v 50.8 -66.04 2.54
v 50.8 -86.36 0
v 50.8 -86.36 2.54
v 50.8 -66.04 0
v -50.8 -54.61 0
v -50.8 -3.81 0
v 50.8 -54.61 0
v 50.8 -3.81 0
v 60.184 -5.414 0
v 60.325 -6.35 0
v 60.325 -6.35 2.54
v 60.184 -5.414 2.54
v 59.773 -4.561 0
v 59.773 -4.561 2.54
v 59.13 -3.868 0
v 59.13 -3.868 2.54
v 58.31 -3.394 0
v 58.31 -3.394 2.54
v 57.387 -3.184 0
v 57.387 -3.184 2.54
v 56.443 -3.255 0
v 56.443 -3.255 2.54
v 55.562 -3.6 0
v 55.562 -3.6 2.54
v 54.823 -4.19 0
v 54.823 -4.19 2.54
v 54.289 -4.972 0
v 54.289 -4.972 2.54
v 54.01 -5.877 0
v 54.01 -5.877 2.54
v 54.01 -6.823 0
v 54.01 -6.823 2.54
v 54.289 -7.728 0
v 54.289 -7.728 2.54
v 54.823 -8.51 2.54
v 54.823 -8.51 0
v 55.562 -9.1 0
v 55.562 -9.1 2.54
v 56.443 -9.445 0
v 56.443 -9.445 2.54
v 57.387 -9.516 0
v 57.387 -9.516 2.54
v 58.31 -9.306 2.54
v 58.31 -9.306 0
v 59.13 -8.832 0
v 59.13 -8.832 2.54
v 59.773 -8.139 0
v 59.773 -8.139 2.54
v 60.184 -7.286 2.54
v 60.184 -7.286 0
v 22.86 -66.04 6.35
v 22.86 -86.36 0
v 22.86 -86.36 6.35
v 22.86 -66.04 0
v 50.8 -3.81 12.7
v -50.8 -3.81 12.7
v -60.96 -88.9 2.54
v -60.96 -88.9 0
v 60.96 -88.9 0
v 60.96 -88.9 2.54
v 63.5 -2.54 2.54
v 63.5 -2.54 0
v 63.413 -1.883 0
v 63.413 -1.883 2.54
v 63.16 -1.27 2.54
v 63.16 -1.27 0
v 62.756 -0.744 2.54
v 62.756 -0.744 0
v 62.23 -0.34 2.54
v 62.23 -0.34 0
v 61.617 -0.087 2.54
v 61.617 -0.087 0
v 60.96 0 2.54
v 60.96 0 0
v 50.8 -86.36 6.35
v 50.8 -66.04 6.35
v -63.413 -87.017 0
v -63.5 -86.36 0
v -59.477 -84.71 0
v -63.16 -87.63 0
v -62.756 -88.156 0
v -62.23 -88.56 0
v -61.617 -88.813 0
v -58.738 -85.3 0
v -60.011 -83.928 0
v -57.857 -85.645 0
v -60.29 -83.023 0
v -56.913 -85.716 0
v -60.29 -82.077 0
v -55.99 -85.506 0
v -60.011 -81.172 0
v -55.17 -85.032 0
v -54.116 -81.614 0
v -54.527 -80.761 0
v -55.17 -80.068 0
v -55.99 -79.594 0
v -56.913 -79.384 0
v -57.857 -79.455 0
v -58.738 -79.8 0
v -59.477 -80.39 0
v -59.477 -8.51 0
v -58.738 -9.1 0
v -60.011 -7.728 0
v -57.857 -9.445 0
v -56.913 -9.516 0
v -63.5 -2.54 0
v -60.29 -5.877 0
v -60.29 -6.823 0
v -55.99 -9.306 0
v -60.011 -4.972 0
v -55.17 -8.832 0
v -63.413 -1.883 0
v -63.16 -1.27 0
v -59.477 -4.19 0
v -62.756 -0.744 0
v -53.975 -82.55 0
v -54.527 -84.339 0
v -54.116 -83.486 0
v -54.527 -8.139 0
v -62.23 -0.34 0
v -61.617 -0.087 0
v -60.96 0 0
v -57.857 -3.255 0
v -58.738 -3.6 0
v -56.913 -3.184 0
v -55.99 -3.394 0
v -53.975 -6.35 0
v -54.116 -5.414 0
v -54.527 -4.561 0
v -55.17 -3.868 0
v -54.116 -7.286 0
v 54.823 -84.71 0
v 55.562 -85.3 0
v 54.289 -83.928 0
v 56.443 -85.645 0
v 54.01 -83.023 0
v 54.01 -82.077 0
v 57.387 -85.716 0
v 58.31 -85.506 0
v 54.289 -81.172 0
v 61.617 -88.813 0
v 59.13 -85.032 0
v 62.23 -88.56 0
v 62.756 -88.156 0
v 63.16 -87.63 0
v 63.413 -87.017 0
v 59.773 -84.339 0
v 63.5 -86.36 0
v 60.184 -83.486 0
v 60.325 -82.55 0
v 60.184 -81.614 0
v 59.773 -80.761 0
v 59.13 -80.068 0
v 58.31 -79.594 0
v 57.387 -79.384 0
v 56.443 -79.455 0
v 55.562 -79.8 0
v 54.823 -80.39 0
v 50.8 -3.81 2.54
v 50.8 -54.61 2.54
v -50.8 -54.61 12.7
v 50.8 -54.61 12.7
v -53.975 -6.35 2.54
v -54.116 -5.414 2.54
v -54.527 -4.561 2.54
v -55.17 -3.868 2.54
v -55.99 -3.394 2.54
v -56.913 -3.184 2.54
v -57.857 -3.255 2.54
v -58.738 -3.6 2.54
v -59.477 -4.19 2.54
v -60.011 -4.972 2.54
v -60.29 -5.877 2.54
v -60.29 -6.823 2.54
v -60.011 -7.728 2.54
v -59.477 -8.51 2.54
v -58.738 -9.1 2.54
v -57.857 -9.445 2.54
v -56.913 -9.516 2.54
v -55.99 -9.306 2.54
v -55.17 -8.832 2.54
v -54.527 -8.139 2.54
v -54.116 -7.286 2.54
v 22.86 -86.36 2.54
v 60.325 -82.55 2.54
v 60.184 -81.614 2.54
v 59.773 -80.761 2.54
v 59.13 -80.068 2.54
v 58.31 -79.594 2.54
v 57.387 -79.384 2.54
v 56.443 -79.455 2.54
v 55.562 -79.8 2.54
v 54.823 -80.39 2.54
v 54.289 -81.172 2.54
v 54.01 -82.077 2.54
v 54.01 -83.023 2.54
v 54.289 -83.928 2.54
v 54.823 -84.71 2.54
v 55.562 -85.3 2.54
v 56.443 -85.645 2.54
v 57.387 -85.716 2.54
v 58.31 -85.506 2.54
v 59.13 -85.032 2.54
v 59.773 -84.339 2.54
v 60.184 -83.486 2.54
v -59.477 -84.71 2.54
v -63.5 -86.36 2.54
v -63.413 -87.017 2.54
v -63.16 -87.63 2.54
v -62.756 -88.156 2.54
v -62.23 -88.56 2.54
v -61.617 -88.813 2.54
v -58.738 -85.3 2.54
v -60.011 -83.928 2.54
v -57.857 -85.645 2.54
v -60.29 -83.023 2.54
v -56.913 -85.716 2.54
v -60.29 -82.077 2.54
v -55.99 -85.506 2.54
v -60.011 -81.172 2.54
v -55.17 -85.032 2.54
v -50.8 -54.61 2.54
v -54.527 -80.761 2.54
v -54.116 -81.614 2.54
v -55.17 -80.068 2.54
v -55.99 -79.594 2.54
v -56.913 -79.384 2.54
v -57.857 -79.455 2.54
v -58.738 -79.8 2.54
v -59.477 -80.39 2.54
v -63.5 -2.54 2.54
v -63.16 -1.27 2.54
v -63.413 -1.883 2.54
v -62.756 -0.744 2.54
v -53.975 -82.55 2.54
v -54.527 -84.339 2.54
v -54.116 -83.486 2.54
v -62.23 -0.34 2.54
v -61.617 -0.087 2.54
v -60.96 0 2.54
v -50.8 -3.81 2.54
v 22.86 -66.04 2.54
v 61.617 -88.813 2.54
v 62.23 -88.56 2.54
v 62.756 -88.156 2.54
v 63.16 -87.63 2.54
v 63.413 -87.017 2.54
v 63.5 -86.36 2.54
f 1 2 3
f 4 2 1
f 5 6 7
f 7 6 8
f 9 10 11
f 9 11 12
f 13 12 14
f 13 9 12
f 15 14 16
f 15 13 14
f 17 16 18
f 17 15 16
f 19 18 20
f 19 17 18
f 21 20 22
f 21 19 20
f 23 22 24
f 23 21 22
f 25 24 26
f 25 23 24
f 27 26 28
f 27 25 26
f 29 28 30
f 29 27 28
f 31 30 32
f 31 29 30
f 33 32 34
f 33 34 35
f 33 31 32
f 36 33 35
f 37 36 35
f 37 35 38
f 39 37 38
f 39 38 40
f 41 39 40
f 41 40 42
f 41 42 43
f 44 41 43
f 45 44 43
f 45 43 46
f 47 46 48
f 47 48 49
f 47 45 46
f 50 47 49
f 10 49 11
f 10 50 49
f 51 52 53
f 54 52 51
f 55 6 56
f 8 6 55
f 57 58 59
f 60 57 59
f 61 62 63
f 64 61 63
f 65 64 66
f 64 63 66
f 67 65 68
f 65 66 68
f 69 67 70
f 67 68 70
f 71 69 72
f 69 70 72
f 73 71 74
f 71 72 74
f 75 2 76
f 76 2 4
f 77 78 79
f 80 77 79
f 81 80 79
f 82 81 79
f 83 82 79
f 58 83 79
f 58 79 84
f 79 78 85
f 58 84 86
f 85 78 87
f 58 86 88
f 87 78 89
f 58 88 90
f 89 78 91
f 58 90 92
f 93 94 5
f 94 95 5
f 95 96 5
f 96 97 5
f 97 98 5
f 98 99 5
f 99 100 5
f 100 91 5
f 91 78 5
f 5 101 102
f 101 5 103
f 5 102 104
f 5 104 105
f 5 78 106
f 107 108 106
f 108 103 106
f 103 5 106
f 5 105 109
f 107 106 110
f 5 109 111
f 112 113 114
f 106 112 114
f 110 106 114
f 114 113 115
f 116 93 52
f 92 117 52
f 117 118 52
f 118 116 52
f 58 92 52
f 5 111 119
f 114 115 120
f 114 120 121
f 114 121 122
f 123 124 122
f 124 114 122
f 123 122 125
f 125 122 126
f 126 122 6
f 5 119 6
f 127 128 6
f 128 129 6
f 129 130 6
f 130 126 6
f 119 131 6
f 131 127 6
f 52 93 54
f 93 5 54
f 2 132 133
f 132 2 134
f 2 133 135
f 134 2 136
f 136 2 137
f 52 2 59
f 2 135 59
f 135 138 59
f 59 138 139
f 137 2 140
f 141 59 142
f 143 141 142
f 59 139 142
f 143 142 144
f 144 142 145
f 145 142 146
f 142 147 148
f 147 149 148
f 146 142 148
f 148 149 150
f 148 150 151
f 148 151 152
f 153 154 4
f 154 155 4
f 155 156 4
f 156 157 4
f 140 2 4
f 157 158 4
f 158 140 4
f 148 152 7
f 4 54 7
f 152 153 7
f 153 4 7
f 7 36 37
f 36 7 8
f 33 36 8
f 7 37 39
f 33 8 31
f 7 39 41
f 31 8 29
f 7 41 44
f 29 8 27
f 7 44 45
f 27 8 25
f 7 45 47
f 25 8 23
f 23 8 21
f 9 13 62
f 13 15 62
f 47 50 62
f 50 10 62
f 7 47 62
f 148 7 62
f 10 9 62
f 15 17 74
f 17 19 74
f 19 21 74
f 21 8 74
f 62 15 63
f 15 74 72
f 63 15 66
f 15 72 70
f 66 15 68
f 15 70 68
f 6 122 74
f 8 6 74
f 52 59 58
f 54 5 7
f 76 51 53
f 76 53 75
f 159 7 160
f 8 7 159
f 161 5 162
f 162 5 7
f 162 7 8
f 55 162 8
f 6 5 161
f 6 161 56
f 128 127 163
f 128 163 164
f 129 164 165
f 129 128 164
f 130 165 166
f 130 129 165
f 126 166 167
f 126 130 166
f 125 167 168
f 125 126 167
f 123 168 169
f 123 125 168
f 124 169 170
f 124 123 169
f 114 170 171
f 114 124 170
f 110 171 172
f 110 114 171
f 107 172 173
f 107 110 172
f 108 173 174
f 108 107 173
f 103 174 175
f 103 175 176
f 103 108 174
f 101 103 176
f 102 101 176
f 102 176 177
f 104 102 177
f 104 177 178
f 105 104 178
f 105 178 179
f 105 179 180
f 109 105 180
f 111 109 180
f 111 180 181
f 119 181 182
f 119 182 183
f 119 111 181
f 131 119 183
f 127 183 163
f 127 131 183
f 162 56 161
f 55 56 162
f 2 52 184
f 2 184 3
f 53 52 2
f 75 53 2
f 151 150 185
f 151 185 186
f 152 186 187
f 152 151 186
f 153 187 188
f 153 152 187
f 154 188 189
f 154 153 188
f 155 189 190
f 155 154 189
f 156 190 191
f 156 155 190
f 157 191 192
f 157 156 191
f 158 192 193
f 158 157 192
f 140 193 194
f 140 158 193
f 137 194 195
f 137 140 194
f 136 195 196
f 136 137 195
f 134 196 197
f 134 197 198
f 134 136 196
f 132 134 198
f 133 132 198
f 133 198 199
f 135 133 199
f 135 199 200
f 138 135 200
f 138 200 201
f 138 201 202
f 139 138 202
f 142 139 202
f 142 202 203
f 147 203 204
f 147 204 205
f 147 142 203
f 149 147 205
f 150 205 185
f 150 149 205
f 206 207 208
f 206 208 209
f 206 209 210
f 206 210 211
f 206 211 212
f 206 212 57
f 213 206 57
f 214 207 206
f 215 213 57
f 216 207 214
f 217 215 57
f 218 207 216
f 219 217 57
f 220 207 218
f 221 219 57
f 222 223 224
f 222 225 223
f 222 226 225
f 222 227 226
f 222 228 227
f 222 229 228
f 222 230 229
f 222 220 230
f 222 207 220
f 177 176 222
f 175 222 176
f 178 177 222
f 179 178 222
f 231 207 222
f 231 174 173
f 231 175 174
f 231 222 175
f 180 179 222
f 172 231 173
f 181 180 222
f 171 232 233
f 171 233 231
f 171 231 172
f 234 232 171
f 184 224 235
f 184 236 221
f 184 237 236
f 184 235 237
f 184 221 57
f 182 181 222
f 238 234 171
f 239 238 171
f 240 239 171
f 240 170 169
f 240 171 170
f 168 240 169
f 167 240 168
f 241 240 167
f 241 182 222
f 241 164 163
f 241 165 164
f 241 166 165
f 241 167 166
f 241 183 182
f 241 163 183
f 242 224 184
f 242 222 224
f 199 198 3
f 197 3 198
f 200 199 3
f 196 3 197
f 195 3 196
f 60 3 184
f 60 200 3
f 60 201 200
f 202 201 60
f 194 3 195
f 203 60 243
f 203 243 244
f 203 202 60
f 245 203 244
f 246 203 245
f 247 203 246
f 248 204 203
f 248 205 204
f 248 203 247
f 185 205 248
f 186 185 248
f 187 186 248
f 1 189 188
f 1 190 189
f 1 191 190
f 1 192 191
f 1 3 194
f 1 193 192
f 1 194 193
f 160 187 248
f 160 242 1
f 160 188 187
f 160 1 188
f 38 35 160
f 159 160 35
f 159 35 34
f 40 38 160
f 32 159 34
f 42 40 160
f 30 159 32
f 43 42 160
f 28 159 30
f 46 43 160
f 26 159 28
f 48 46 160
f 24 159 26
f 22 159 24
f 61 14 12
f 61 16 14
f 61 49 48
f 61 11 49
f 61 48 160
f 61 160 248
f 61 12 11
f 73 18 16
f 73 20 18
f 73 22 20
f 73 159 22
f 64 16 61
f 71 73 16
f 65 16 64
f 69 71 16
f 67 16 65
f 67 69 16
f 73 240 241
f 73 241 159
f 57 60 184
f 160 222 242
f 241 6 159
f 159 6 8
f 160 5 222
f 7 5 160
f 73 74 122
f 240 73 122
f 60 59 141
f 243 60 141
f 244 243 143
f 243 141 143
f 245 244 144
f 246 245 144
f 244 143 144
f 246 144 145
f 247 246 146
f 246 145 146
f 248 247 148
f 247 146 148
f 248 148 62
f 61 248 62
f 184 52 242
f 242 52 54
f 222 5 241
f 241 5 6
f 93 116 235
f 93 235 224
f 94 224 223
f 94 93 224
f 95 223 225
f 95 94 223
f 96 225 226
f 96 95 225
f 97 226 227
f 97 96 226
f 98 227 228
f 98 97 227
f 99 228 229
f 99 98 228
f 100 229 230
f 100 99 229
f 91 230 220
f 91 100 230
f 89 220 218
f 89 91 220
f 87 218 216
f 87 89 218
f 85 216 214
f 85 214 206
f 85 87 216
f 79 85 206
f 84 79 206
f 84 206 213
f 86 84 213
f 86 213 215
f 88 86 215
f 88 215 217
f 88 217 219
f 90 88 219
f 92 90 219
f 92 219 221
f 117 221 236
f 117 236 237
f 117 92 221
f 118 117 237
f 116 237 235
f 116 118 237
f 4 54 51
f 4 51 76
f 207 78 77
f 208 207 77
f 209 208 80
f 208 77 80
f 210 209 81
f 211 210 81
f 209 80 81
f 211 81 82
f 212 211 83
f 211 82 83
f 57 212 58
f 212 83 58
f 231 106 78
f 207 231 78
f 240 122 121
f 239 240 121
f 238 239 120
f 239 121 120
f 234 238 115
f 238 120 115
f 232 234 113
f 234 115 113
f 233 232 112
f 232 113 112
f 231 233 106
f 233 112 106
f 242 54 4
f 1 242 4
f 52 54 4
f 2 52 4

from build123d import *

# Parameters (mm, degrees)
F0_W     = 101.6
F0_H     = 50.8
F1_DEPTH = 12.7
F0_W_2   = 27.94
F0_H_2   = 20.32
F2_DEPTH = 6.35
F0_R     = 3.175
F3_DEPTH = 2.54


with BuildPart() as f1:
    # F0 (on Top) → F1 (new body)
    with BuildSketch(Plane.XY):
        with Locations((0, -29.21)):
            Rectangle(F0_W, F0_H)
    extrude(amount=F1_DEPTH)


with BuildPart() as f2:
    # F0 (on Top) → F2 (new body)
    with BuildSketch(Plane.XY):
        with Locations((36.83, -76.2)):
            Rectangle(F0_W_2, F0_H_2)
    extrude(amount=F2_DEPTH)


with BuildPart() as f3:
    # F0 (on Top) → F3 (new body)
    with BuildSketch(Plane.XY):
        with BuildLine():
            Line((60.96, 0), (-60.96, 0))
            ThreePointArc((-60.96, 0), (-62.756051, -0.743949), (-63.5, -2.54))
            Line((-63.5, -2.54), (-63.5, -86.36))
            ThreePointArc((-63.5, -86.36), (-62.756051, -88.156051), (-60.96, -88.9))
            Line((-60.96, -88.9), (60.96, -88.9))
            ThreePointArc((60.96, -88.9), (62.756051, -88.156051), (63.5, -86.36))
            Line((63.5, -86.36), (63.5, -2.54))
            ThreePointArc((63.5, -2.54), (62.756051, -0.743949), (60.96, 0))
        make_face()
        with Locations((-57.15, -82.55)):
            Circle(F0_R, mode=Mode.SUBTRACT)
        with Locations((57.15, -82.55)):
            Circle(F0_R, mode=Mode.SUBTRACT)
        with Locations((36.83, -76.2)):
            Rectangle(F0_W_2, F0_H_2, mode=Mode.SUBTRACT)
        with Locations((-57.15, -6.35)):
            Circle(F0_R, mode=Mode.SUBTRACT)
        with Locations((0, -29.21)):
            Rectangle(F0_W, F0_H, mode=Mode.SUBTRACT)
        with Locations((57.15, -6.35)):
            Circle(F0_R, mode=Mode.SUBTRACT)
    extrude(amount=F3_DEPTH)


solid = Compound([f1.part, f2.part, f3.part])
